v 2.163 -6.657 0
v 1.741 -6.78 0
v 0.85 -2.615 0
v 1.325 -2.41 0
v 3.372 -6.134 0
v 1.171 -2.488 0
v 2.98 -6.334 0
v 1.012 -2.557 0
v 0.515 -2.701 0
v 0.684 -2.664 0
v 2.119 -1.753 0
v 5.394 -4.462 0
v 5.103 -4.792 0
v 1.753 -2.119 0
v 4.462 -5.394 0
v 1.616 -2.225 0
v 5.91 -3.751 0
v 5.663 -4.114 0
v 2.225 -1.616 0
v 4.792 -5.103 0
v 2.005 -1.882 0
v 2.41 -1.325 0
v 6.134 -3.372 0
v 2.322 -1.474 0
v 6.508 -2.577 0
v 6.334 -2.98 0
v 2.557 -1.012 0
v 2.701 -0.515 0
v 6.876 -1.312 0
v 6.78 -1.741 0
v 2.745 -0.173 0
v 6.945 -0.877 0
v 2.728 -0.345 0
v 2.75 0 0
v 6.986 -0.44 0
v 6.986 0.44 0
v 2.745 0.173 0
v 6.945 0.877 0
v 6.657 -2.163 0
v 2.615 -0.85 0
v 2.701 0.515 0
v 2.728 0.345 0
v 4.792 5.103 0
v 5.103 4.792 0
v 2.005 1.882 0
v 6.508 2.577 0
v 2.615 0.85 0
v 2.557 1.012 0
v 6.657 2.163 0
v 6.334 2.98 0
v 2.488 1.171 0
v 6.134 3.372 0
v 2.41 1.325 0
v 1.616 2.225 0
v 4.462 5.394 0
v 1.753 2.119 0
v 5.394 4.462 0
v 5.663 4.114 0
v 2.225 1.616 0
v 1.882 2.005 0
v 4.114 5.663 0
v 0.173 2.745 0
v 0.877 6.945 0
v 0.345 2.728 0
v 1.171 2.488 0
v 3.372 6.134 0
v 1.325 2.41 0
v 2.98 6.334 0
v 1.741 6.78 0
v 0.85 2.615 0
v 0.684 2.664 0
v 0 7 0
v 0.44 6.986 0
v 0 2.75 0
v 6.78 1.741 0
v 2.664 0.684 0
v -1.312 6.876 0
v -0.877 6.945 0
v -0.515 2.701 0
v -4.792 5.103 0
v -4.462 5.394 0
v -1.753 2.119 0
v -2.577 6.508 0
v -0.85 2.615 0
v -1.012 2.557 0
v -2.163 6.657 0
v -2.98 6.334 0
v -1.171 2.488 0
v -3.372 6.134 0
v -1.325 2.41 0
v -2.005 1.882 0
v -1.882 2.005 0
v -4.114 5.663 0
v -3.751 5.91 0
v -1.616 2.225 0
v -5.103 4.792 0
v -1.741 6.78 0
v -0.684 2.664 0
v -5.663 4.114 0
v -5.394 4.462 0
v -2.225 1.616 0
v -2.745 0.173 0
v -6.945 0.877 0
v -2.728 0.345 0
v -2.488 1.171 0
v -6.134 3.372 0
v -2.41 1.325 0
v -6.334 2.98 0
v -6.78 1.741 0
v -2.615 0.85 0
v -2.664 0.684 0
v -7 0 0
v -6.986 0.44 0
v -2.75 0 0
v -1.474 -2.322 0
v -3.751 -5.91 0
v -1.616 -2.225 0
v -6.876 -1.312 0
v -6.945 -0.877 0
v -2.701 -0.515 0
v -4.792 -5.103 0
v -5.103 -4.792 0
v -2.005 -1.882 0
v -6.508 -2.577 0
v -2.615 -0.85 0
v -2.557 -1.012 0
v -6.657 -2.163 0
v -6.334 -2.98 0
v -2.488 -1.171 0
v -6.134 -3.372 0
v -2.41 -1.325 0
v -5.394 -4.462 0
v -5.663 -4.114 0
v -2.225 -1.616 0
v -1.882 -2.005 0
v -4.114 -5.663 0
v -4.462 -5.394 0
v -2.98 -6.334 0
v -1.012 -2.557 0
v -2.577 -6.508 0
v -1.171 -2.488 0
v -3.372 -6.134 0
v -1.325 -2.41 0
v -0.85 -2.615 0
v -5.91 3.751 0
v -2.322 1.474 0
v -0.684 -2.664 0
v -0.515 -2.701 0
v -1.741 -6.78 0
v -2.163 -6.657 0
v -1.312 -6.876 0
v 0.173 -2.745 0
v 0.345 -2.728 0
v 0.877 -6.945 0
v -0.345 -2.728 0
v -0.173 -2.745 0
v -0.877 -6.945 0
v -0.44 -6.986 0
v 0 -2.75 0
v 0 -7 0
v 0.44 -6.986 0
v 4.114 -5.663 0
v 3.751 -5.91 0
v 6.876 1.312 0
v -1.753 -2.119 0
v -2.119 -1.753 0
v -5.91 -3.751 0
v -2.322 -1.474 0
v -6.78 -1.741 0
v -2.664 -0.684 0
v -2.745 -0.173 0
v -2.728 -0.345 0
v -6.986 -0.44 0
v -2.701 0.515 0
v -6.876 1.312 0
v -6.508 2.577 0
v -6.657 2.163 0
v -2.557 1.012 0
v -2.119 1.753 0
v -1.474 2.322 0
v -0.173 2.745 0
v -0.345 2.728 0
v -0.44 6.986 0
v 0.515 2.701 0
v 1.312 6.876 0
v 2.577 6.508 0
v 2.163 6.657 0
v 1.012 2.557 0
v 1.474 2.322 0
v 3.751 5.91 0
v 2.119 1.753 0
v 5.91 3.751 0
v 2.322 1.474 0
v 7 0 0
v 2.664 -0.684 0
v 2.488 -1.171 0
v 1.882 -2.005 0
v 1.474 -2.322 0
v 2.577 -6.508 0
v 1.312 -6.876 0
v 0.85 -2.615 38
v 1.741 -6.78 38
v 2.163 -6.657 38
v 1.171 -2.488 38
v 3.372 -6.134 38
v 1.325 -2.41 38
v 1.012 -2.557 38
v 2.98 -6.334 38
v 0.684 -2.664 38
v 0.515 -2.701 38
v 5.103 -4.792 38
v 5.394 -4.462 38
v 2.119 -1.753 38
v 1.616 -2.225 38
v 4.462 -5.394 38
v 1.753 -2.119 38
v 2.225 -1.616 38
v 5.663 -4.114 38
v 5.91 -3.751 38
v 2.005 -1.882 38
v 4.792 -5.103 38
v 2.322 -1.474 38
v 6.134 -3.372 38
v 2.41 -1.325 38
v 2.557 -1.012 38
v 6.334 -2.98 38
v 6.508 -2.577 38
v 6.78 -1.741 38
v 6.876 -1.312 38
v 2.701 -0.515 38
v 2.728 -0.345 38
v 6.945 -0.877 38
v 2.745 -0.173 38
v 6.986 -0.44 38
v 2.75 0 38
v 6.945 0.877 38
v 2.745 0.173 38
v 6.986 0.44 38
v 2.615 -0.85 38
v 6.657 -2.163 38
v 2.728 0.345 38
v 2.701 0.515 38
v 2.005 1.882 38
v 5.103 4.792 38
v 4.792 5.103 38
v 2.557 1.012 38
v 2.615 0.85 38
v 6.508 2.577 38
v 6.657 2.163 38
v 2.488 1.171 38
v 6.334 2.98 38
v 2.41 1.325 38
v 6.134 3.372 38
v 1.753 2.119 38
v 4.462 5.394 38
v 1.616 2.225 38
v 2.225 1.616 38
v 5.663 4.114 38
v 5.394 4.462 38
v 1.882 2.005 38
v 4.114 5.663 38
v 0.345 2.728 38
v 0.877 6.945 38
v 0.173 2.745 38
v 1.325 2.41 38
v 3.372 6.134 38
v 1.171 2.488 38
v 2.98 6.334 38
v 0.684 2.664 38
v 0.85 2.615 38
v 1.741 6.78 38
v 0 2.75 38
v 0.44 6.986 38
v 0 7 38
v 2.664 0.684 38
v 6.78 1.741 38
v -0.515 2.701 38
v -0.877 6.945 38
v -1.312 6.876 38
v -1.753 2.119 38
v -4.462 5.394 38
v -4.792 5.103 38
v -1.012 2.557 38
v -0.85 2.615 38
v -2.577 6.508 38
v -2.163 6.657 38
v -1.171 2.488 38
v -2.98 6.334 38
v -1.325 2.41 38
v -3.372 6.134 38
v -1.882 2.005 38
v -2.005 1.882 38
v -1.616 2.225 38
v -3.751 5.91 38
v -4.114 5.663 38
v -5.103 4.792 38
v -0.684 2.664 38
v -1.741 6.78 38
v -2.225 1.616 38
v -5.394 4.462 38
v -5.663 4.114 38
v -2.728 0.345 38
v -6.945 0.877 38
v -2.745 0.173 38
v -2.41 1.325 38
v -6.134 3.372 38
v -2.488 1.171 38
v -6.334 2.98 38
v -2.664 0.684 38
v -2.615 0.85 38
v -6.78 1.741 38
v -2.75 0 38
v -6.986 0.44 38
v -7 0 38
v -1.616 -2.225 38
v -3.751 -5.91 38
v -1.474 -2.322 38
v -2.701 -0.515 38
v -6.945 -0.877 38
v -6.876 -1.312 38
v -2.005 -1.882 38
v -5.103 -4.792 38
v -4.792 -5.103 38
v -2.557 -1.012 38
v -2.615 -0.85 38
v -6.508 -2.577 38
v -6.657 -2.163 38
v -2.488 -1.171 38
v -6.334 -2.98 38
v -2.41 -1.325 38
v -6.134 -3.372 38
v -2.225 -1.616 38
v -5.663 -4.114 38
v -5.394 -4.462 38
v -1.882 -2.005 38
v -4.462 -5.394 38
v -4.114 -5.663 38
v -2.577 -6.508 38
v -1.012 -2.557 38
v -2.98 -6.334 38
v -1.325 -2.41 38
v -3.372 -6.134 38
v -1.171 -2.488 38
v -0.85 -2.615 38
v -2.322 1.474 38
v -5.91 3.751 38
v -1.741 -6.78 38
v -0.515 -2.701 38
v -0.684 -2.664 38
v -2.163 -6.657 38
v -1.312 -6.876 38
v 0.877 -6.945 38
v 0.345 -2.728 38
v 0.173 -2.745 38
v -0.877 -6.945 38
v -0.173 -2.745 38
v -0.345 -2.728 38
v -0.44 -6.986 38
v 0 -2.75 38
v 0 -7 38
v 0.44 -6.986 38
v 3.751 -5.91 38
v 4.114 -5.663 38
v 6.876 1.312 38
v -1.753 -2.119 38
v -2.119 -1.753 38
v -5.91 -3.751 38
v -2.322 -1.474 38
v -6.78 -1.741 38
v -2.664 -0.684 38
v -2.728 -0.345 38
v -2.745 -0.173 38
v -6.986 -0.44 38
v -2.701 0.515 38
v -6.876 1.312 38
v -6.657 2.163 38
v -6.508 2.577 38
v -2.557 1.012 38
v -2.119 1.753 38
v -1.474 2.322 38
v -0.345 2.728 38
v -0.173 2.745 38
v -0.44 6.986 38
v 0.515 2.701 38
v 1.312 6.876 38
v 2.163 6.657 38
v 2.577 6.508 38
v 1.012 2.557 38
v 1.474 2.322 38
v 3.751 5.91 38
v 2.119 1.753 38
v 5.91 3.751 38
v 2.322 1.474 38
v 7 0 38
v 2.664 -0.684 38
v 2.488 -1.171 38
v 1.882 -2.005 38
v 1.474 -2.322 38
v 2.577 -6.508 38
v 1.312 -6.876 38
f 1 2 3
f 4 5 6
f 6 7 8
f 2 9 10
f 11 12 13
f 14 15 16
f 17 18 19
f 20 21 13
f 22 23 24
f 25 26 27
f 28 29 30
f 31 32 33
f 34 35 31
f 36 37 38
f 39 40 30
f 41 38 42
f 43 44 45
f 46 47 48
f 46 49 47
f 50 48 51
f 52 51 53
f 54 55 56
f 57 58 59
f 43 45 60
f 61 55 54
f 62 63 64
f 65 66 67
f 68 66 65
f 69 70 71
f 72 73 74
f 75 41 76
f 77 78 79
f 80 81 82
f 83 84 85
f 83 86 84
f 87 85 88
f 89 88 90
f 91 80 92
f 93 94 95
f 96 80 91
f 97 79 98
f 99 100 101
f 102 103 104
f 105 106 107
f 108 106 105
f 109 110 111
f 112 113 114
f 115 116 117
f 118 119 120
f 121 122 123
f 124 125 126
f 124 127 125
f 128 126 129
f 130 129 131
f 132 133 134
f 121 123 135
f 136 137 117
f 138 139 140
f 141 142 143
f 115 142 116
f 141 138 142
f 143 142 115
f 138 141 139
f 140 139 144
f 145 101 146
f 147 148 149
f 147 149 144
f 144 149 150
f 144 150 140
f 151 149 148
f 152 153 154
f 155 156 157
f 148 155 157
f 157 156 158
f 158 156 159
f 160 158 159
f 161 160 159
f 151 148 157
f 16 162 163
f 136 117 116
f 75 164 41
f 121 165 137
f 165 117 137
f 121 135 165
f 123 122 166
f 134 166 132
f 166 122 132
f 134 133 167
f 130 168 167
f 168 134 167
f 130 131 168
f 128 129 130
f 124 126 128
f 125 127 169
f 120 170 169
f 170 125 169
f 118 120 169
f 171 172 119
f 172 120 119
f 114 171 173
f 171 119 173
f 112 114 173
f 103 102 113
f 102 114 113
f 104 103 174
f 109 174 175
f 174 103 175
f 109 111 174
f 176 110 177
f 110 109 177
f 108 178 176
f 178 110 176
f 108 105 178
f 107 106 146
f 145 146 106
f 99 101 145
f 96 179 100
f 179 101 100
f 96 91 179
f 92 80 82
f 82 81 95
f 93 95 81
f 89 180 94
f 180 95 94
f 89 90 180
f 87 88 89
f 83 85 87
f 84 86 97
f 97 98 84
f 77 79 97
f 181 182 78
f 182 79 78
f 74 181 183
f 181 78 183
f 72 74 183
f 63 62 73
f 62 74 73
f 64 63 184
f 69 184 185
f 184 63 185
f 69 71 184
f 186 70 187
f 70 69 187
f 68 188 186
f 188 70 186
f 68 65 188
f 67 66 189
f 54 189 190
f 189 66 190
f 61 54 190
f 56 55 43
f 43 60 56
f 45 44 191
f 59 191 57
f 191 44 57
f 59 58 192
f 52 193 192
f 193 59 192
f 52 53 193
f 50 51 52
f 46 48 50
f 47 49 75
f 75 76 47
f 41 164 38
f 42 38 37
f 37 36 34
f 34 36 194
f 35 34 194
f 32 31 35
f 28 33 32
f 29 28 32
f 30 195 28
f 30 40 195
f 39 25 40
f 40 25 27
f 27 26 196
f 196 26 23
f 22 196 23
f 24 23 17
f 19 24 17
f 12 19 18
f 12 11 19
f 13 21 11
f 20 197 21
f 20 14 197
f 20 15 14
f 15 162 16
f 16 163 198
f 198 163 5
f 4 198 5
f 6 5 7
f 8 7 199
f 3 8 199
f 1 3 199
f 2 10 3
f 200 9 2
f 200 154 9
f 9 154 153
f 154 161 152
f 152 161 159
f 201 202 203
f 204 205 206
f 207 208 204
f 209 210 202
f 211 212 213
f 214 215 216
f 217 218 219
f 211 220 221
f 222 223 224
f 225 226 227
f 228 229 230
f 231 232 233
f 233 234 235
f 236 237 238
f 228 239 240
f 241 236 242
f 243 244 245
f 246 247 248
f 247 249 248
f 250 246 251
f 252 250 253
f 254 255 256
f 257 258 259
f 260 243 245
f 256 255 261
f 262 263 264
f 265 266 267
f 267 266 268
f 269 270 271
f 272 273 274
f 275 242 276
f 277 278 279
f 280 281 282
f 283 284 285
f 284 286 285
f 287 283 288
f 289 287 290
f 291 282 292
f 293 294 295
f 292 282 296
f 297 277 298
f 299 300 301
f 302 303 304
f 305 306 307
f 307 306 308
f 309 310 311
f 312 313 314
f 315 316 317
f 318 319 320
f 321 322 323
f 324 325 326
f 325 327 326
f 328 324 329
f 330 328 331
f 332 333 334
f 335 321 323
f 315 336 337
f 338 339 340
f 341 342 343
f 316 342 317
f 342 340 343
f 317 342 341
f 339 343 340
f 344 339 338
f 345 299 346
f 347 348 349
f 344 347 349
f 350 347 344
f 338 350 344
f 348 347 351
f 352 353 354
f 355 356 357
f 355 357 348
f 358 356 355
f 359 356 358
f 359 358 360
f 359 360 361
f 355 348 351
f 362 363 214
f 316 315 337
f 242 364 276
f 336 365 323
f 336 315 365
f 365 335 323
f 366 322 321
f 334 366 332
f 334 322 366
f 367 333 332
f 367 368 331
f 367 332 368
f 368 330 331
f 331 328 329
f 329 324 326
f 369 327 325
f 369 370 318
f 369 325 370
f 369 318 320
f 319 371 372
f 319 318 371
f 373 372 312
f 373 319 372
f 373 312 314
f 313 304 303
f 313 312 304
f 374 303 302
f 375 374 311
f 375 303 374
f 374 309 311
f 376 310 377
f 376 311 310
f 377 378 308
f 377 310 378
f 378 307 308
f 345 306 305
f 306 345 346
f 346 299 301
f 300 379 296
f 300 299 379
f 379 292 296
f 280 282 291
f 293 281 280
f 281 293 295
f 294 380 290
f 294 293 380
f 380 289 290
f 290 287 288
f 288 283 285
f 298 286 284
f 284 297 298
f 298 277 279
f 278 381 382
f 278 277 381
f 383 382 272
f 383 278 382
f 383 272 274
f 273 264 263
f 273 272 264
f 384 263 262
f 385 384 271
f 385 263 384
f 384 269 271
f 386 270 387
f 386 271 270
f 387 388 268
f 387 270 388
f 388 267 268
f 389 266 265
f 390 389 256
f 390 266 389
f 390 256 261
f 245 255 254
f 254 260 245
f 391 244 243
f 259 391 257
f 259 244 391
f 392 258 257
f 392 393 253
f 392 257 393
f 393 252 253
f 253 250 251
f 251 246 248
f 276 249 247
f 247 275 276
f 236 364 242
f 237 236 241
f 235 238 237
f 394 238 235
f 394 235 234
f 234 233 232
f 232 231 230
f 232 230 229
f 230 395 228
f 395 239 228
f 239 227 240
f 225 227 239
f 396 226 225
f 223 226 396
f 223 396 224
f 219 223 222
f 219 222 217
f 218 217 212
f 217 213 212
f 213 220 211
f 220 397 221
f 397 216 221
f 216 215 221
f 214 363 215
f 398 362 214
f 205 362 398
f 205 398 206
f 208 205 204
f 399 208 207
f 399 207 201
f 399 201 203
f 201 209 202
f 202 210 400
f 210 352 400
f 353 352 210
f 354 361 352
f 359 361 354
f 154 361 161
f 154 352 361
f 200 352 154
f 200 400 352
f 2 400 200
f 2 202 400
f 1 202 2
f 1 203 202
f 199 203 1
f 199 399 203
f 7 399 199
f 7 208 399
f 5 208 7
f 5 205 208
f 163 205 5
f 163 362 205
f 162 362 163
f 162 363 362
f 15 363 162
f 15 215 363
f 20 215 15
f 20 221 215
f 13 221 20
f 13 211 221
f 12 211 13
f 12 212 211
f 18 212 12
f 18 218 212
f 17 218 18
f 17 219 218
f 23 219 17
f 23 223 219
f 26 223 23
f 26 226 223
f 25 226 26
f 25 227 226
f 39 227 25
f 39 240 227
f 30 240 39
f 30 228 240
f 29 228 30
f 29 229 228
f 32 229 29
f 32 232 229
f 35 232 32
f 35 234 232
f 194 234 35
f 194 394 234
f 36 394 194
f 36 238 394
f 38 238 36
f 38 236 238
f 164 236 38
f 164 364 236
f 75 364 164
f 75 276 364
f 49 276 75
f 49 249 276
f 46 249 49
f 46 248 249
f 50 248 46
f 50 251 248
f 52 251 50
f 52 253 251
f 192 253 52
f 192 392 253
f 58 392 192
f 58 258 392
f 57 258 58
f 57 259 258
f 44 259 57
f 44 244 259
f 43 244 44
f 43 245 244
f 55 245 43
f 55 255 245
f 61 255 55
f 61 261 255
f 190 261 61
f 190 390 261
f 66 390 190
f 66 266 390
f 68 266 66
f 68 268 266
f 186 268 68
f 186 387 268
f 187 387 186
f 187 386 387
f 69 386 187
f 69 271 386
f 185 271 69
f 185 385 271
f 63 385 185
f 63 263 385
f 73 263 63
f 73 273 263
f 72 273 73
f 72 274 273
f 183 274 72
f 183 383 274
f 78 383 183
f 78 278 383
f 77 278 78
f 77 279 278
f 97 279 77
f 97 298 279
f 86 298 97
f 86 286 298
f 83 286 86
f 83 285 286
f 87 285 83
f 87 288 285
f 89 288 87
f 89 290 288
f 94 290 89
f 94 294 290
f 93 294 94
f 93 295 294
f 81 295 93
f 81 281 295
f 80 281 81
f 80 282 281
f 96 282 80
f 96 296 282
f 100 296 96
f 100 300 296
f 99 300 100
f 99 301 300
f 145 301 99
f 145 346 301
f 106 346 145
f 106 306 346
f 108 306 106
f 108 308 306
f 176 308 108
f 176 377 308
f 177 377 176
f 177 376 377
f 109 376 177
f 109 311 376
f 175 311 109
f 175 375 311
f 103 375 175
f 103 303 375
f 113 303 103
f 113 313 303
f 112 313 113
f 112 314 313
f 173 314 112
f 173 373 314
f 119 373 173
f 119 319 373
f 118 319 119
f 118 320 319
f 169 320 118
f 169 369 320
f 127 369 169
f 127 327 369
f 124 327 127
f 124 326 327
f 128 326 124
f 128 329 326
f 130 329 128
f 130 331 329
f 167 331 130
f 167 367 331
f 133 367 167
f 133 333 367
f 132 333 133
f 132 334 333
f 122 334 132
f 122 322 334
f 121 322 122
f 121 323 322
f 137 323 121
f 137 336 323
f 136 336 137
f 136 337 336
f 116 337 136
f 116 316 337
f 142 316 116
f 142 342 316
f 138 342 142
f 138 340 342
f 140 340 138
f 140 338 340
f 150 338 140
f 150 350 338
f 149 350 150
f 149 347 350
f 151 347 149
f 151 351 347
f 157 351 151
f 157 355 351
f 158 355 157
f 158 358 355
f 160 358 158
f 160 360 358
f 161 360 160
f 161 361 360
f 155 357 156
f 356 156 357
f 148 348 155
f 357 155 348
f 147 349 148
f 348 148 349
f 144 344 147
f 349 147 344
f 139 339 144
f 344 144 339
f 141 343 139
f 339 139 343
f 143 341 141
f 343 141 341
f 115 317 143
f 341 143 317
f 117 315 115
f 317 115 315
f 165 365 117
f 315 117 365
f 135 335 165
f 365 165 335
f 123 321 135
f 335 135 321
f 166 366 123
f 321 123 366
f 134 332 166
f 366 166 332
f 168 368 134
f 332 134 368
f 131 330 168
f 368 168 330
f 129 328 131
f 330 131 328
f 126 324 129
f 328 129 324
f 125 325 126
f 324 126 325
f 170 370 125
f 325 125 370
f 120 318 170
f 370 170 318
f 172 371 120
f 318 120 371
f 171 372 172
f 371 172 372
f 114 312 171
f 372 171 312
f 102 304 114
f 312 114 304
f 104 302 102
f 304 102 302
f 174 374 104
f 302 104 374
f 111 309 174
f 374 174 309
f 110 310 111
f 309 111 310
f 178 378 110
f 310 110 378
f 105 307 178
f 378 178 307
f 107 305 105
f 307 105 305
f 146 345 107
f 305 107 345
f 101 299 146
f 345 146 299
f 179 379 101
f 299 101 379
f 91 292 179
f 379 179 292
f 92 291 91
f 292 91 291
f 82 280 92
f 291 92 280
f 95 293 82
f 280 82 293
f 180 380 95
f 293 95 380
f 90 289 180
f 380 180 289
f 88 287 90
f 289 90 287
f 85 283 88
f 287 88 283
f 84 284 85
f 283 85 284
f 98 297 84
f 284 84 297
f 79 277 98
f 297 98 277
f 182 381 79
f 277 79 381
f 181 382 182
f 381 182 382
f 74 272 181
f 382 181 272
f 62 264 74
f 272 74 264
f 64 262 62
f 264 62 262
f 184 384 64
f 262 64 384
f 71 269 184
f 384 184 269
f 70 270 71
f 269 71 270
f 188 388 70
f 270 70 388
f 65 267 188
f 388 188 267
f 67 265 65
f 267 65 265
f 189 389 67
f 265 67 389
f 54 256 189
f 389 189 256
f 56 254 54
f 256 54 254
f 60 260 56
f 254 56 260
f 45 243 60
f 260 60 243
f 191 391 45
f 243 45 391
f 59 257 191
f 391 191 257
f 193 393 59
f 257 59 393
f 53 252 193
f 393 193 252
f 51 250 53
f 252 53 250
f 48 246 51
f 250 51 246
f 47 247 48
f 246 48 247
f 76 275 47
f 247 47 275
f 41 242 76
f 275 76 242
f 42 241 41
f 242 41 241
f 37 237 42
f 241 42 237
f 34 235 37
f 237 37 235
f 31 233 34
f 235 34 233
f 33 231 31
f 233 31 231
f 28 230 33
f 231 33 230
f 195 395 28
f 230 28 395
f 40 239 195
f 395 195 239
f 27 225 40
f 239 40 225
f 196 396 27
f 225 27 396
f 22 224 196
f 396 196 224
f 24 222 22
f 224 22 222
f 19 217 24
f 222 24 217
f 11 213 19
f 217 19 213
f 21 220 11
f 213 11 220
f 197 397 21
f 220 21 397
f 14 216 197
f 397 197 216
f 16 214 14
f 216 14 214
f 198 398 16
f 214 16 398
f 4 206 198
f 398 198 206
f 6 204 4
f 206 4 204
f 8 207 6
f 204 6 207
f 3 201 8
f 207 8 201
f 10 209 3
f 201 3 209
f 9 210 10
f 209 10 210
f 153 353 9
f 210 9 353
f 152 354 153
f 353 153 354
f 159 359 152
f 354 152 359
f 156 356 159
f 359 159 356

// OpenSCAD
// 'Customizable Spacer and standoff' Version 1.0 by sn4k3 
// is licensed under the Attribution - Share Alike license. 
// (c) April 2019

outer_diameter=14;
inner_diameter=5.5;
height=38;

outer_number_of_sides=100; //[3,4,5,6,7,8,9,10,12,15,100:round]
inner_number_of_sides=100; //[3,4,5,6,7,8,9,10,12,15,100:round]

/* [ Top Extra Feature ] */
top_feature_enable = 0; // [0:No,1:Yes]
top_feature_diameter = 8;
// Use positive value for standoff and negative for hole
top_feature_height = -5.10;
top_feature_number_of_sides=6; //[3,4,5,6,7,8,9,10,12,15,100:round]

/* [ Bottom Extra Feature ] */
bottom_feature_enable = 0; // [0:No,1:Yes]
bottom_feature_diameter = 8;
// Use positive value for standoff and negative for hole
bottom_feature_height = -5.10;
bottom_feature_number_of_sides=6; //[3,4,5,6,7,8,9,10,12,15,100:round]

/* [Hidden] */
build_spacer();

module build_spacer()
{	
	difference()
	{
		linear_extrude(height,convexity=10)
		difference()
		{
			circle((outer_diameter)/2,$fn=outer_number_of_sides);
			circle(inner_diameter/2,$fn=inner_number_of_sides);
            
		}
        
        if(bottom_feature_enable && bottom_feature_height < 0)
        {
            linear_extrude(-bottom_feature_height,convexity=10)
            difference()
            {
                circle((bottom_feature_diameter)/2,$fn=bottom_feature_number_of_sides);
            }
        }
        
        if(top_feature_enable && top_feature_height < 0)
        {
            translate([0,0,height+top_feature_height])
            linear_extrude(-top_feature_height,convexity=10)
            difference()
            {
                circle((top_feature_diameter)/2,$fn=top_feature_number_of_sides);
            }
        }
	}	
    
    if(bottom_feature_enable && bottom_feature_height > 0)
    {
        linear_extrude(1.2,convexity=10)    // Seal bottom just in case
            circle((outer_diameter)/2,$fn=100); // Seal bottom just in case
        
        // Standoff
        translate([0,0,-bottom_feature_height])
            linear_extrude(bottom_feature_height,convexity=10)
                circle((bottom_feature_diameter)/2,$fn=bottom_feature_number_of_sides);
    }
    
    if(top_feature_enable && top_feature_height > 0)
    {
        translate([0,0,height-1.2])         // Seal top just in case
            linear_extrude(1.2,convexity=10)    // Seal top just in case
                circle((outer_diameter)/2,$fn=100); // Seal top just in case
        
        // Standoff
        translate([0,0,height])
            linear_extrude(top_feature_height,convexity=10)
                circle((top_feature_diameter)/2,$fn=top_feature_number_of_sides);
    }
   
}
